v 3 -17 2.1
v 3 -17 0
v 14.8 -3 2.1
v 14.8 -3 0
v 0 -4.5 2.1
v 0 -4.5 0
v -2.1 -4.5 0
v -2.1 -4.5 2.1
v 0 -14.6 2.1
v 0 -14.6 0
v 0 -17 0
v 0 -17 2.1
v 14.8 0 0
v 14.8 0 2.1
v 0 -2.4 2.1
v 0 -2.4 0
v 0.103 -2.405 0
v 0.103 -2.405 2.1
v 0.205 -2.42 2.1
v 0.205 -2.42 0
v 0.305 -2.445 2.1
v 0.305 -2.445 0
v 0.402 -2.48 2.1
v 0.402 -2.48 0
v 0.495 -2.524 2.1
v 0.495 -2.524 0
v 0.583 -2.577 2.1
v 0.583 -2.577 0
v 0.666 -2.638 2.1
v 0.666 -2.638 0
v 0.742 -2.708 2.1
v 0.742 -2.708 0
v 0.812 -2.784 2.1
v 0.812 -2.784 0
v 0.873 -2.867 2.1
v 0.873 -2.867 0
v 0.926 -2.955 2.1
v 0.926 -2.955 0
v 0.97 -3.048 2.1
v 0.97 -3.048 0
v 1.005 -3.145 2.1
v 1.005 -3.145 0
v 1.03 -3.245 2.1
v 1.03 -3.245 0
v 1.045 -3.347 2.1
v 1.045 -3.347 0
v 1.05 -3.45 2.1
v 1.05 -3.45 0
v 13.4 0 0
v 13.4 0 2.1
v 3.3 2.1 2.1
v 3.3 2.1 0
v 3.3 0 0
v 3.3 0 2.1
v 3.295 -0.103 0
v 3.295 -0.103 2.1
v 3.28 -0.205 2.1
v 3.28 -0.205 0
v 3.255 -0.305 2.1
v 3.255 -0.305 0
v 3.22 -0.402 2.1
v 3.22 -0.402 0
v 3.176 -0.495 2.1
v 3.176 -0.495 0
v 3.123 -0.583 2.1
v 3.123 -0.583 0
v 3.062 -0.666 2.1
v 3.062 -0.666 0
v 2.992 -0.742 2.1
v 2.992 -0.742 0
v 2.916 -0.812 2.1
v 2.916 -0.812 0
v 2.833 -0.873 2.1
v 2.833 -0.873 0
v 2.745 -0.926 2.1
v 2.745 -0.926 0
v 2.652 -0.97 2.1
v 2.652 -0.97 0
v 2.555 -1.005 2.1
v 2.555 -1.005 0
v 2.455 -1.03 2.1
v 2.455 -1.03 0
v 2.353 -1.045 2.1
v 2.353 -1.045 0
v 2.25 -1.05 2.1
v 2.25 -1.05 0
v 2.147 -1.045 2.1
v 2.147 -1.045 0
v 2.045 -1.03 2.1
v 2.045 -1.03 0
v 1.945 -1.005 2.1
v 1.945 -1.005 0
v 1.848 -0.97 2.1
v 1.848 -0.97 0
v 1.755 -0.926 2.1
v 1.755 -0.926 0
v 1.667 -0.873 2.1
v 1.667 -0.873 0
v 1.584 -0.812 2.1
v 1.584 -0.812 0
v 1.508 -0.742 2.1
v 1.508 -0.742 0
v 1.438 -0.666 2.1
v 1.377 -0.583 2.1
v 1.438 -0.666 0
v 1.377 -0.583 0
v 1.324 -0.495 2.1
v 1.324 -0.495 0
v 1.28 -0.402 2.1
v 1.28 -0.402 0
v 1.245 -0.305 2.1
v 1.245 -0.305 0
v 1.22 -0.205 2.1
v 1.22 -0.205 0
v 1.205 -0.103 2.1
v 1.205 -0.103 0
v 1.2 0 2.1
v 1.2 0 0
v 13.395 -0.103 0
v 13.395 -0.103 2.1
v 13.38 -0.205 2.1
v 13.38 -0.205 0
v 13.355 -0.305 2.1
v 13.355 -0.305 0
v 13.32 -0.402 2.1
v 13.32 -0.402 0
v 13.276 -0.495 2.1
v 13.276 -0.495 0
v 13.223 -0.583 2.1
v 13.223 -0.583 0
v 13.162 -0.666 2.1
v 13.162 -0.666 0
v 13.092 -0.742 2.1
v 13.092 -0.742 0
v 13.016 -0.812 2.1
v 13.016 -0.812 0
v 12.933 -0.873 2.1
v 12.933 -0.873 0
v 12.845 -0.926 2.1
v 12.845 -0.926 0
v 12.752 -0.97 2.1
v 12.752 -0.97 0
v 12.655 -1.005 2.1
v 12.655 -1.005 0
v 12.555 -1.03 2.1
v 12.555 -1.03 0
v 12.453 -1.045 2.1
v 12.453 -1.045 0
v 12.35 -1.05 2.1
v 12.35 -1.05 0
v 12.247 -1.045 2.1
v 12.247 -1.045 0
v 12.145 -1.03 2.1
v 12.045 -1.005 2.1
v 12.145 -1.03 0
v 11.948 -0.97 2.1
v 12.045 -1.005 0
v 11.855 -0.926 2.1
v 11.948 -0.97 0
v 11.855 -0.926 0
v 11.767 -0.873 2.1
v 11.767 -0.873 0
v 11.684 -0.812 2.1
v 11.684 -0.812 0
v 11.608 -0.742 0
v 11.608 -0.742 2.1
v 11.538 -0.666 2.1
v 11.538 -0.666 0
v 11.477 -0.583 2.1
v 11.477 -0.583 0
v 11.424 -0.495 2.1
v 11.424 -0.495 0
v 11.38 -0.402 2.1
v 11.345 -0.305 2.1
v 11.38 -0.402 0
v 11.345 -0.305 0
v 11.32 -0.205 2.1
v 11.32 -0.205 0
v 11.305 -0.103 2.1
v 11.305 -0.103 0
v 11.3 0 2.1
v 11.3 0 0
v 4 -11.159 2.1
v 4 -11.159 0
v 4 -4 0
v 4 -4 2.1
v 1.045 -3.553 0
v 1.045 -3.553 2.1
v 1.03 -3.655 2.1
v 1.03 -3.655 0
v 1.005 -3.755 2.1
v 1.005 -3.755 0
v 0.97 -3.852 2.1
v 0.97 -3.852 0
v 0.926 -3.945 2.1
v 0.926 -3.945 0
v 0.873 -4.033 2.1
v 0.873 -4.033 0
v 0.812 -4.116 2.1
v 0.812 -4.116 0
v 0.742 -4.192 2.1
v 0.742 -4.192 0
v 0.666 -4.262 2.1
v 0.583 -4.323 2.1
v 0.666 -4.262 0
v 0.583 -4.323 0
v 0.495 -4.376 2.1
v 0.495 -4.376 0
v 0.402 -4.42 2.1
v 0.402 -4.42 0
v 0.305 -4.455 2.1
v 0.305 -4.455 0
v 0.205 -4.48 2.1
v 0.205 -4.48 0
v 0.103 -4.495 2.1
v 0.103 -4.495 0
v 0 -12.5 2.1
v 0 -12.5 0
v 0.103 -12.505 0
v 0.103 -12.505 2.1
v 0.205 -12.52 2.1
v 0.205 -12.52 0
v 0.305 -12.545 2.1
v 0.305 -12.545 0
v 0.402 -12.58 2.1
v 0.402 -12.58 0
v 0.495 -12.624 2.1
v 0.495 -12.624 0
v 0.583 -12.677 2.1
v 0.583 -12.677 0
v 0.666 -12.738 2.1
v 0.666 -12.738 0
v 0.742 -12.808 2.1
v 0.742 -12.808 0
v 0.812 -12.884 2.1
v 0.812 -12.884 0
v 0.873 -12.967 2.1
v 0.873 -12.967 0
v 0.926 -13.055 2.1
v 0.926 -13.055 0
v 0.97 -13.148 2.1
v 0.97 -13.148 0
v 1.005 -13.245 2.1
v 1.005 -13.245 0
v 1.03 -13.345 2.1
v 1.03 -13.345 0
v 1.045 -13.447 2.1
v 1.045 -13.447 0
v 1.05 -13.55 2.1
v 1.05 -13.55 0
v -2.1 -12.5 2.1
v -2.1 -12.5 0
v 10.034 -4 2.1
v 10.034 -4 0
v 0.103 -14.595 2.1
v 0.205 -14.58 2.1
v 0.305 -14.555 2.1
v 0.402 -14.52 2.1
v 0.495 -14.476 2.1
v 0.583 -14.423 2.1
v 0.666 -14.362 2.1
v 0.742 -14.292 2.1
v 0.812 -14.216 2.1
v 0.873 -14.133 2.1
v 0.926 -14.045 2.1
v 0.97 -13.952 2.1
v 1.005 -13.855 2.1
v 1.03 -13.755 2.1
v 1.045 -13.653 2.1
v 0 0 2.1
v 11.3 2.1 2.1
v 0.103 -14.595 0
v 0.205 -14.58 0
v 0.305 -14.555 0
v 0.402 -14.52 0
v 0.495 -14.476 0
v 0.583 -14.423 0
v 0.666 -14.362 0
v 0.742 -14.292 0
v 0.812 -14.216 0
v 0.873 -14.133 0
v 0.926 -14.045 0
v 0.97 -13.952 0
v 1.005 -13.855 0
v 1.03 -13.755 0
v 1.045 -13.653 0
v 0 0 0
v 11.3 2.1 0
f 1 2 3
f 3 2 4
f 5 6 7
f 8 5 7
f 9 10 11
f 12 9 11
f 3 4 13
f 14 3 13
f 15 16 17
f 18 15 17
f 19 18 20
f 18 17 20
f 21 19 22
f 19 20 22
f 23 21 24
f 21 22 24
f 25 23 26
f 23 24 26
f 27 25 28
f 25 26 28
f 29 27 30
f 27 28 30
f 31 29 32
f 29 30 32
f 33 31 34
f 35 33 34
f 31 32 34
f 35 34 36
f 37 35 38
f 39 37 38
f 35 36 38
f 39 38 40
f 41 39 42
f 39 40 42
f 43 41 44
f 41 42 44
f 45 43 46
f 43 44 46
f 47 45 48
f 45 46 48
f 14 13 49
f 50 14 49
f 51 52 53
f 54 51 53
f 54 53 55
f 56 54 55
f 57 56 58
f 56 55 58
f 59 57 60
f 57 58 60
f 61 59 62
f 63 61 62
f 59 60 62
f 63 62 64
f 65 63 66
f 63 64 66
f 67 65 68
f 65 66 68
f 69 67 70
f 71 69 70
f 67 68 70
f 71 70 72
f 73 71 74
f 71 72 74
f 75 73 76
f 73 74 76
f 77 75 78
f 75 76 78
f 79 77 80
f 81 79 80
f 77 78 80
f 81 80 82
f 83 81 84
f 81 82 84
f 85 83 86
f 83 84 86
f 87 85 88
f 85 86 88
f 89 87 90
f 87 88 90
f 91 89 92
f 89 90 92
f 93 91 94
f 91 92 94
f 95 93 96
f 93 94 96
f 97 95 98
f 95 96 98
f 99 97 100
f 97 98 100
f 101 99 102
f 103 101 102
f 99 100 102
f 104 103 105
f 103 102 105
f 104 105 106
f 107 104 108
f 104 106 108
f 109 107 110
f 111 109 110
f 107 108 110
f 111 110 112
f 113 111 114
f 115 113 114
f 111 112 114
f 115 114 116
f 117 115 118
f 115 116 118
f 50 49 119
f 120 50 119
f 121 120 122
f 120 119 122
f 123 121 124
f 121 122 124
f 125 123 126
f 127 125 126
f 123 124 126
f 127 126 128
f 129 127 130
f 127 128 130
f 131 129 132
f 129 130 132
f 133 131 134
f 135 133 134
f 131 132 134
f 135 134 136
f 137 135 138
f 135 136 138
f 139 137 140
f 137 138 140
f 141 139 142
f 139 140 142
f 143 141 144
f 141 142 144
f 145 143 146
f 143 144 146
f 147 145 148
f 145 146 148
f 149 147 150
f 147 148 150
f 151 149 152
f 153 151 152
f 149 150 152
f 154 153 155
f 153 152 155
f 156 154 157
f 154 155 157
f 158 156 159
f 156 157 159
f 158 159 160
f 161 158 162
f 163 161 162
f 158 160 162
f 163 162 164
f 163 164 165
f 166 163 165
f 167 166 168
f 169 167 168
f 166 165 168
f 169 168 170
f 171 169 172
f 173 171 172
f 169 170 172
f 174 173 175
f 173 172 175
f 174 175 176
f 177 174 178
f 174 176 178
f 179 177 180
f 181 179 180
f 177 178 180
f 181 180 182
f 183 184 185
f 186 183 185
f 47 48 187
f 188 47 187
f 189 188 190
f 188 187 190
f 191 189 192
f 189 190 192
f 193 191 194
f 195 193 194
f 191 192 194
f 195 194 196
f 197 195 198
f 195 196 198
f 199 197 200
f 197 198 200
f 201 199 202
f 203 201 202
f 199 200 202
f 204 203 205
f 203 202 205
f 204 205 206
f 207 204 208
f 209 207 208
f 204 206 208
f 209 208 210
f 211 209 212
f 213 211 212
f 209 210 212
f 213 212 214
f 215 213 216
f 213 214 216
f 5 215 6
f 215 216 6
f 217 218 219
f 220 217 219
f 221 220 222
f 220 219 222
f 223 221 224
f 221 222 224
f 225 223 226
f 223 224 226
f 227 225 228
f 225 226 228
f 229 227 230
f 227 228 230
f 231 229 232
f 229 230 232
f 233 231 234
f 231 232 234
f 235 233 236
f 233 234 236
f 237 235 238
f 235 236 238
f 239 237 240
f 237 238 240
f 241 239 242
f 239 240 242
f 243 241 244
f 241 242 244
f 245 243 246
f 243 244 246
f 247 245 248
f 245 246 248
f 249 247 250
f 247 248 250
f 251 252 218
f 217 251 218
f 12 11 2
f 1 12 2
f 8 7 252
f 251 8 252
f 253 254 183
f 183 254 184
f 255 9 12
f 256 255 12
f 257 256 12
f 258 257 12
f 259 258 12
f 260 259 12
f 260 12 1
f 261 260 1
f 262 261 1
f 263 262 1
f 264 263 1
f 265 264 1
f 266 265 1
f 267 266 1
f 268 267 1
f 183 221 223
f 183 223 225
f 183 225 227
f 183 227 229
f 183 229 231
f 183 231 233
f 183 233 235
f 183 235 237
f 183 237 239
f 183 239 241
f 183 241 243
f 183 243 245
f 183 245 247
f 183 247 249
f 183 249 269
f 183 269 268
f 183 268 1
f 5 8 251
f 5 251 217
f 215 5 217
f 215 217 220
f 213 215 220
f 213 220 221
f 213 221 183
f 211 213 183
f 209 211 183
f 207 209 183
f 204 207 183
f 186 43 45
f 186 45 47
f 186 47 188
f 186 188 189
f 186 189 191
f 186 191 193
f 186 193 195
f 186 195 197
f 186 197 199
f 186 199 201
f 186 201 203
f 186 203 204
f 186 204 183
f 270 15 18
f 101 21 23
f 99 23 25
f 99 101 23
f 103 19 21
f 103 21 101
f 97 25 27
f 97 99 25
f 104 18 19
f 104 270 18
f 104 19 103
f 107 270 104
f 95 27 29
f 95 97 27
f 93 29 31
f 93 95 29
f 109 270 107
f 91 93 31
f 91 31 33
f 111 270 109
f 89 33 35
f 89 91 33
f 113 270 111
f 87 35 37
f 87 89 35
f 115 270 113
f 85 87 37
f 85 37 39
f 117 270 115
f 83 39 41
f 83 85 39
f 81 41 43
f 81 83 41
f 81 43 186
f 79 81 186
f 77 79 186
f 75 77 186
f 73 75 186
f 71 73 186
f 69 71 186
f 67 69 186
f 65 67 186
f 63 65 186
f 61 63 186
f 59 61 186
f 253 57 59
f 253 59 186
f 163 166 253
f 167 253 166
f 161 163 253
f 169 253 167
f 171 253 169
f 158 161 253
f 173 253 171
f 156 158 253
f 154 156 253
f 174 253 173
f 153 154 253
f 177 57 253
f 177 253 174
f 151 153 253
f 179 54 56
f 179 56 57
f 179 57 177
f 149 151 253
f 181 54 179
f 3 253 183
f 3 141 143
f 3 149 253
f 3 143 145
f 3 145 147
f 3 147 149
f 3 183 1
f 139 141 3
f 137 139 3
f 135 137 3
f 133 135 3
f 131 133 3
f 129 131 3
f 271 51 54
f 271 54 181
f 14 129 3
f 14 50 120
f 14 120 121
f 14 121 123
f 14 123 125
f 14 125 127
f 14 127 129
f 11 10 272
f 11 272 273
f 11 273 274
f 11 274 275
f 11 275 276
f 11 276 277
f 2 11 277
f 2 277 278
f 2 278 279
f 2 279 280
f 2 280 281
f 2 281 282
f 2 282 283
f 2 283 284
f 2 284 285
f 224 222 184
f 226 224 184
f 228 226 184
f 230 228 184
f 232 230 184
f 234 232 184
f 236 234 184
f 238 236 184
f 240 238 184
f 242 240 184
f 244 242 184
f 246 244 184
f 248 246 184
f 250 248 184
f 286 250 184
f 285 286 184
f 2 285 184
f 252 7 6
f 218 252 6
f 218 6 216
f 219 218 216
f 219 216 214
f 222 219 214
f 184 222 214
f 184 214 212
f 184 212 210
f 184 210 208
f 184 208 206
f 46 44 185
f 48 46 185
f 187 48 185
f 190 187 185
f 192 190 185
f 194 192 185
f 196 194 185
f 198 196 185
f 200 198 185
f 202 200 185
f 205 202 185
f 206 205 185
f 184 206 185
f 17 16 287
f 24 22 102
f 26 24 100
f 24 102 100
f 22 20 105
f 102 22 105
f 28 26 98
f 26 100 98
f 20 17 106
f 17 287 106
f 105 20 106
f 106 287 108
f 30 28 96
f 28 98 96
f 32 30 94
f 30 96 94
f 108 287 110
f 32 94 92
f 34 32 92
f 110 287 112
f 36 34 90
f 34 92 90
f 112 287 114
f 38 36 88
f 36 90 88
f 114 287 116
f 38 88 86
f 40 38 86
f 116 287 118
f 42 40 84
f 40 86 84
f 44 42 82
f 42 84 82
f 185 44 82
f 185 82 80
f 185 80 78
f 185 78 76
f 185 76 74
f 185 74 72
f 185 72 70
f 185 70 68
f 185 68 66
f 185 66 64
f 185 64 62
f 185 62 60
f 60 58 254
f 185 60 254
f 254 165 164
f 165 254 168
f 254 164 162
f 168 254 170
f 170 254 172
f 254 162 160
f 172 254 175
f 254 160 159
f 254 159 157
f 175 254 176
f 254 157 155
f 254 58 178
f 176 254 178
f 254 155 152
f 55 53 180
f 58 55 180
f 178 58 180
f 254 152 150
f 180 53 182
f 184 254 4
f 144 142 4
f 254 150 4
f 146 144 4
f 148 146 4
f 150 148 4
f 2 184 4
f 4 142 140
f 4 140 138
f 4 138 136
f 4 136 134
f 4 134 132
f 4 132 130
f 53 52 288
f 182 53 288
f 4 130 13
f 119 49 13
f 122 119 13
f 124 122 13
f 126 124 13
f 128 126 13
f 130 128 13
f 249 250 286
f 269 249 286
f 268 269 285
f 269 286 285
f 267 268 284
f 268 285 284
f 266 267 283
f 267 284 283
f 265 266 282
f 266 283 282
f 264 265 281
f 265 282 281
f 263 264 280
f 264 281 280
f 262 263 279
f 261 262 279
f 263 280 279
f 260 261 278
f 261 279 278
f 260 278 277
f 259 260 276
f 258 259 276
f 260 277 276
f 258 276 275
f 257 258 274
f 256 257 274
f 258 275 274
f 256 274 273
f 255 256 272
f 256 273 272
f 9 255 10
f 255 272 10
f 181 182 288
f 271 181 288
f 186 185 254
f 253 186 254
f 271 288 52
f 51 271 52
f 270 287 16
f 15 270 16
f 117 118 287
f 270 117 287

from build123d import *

# Parameters (mm, degrees)
EXTRUDE_1_DEPTH = 2.1


with BuildPart() as part:
    # 草图1 → 凸台-拉伸1 (new body)
    with BuildSketch(Plane.XY):
        with BuildLine():
            Line((1.2, 0), (0, 0))
            Line((0, 0), (0, -2.4))
            ThreePointArc((0, -2.4), (0.74246212, -2.70753788), (1.05, -3.45))
            ThreePointArc((1.05, -3.45), (0.74246212, -4.19246212), (0, -4.5))
            Line((0, -4.5), (-2.1, -4.5))
            Line((-2.1, -4.5), (-2.1, -12.5))
            Line((-2.1, -12.5), (0, -12.5))
            ThreePointArc((0, -12.5), (0.74246212, -12.80753788), (1.05, -13.55))
            ThreePointArc((1.05, -13.55), (0.74246212, -14.29246212), (0, -14.6))
            Line((0, -14.6), (0, -17))
            Line((0, -17), (3, -17))
            Line((3, -17), (14.8, -3))
            Line((14.8, -3), (14.8, 0))
            Line((14.8, 0), (13.4, 0))
            ThreePointArc((13.4, 0), (12.35, -1.05), (11.3, 0))
            Line((11.3, 0), (11.3, 2.1))
            Line((11.3, 2.1), (3.3, 2.1))
            Line((3.3, 2.1), (3.3, 0))
            ThreePointArc((3.3, 0), (2.25, -1.05), (1.2, 0))
        make_face()
        Polygon((4, -11.158586353), (4, -4), (10.033665641, -4), align=None, mode=Mode.SUBTRACT)
    extrude(amount=EXTRUDE_1_DEPTH)


solid = part.part
